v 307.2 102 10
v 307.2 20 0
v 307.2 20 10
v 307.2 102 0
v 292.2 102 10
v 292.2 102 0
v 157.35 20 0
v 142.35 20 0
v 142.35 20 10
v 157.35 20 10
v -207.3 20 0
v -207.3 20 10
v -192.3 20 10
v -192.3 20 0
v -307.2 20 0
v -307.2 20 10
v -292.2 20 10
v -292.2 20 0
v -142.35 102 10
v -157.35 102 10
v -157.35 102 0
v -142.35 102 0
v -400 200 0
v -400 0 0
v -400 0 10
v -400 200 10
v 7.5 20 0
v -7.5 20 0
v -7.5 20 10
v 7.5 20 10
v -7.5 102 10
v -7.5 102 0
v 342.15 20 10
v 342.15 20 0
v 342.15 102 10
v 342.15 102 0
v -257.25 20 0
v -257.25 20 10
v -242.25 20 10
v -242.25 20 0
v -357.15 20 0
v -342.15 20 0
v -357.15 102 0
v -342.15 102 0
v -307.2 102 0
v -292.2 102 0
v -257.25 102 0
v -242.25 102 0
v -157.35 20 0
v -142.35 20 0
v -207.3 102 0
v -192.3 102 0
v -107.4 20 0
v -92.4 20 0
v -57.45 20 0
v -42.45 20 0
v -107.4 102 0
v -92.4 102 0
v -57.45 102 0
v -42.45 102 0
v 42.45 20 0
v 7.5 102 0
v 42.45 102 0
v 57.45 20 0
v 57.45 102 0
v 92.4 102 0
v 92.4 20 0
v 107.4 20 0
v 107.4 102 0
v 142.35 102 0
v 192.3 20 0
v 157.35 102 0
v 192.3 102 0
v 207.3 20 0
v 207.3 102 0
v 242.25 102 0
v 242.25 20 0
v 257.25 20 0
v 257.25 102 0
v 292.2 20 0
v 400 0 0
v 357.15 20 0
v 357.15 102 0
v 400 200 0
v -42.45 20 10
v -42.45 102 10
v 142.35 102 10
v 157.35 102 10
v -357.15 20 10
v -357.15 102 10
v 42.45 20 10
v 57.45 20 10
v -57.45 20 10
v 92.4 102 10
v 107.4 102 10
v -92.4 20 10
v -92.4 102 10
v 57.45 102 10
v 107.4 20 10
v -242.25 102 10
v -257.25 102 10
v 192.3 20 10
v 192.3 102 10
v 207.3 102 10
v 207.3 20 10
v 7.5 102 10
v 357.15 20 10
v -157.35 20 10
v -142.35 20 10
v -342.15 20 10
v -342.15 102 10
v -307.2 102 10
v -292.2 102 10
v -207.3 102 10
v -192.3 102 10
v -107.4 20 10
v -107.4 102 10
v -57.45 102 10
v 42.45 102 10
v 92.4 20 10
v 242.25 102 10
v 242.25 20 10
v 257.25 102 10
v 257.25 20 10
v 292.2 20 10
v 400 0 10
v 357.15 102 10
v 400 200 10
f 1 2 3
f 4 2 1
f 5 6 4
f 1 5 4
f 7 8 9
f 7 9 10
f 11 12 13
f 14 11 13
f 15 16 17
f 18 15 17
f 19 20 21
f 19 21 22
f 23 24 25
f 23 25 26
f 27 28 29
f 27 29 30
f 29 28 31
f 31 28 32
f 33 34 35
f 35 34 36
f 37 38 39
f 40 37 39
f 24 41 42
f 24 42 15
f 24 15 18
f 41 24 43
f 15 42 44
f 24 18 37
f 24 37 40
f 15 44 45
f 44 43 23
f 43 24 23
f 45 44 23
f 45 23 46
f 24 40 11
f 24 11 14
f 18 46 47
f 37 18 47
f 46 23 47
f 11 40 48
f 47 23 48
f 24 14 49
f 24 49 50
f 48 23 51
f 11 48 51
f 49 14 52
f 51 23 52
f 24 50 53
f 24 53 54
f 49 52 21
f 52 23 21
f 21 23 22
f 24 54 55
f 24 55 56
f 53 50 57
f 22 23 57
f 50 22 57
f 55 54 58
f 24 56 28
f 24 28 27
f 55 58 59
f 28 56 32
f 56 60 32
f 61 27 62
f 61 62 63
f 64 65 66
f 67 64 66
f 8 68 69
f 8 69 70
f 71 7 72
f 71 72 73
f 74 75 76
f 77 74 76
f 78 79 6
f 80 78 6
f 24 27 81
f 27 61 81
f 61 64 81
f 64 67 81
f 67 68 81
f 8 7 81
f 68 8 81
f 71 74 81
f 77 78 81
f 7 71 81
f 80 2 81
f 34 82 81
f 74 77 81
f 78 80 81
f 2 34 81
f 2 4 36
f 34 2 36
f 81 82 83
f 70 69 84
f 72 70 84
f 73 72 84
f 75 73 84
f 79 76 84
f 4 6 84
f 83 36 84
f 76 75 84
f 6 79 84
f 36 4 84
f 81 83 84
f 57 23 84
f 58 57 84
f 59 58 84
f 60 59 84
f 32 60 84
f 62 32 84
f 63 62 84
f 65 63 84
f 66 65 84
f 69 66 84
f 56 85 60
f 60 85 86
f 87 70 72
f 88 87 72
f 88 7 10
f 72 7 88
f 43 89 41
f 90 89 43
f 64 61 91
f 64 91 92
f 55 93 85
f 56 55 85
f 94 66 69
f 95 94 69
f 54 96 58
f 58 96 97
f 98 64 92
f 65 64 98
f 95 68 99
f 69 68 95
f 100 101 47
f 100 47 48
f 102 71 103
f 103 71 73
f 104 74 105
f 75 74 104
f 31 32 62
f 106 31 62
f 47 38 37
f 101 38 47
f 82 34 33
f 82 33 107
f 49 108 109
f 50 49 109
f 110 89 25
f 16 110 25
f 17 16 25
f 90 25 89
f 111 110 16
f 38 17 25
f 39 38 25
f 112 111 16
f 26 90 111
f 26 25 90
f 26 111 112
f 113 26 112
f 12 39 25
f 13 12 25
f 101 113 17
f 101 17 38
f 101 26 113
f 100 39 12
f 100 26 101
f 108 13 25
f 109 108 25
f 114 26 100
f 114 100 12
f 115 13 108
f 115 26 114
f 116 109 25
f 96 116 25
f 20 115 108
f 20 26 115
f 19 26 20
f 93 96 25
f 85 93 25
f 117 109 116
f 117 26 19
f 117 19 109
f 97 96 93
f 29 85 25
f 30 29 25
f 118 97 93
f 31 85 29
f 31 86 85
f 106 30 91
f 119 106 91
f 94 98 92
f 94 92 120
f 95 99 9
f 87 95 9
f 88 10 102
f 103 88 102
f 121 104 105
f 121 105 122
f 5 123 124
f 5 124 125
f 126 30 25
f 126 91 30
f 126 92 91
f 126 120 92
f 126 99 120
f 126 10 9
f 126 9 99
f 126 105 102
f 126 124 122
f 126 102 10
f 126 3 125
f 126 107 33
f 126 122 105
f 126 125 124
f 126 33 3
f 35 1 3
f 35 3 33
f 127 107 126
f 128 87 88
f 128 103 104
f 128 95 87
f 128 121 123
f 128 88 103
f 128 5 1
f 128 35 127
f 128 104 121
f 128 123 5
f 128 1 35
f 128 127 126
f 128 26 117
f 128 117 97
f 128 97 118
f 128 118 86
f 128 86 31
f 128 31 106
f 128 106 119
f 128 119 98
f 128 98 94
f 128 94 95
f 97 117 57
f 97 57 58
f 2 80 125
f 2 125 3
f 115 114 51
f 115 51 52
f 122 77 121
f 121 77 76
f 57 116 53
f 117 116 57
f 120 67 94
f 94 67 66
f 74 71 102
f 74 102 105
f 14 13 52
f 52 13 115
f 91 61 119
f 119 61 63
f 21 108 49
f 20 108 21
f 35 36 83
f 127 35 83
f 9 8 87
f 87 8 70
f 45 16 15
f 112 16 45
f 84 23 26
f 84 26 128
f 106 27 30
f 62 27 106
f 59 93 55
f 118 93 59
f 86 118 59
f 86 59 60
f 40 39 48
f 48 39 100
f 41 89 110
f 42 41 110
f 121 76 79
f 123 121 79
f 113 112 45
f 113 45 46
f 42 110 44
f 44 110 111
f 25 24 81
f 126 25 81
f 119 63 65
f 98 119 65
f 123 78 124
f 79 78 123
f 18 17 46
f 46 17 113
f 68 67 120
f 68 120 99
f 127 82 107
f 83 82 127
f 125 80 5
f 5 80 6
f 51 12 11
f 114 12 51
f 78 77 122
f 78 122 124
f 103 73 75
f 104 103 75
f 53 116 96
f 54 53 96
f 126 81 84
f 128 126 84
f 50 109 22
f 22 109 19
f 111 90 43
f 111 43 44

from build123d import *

# Parameters (mm, degrees)
SKETCH002_W                             = 800
SKETCH002_H                             = 200
PAD001_DEPTH                            = 10
SKETCH003_W                             = 15
SKETCH003_H                             = 82
POCKET001_DEPTH                         = 1649.364514
POCKET001_DEPTH_BACK                    = 1659.364514
SKETCH003_LINEARPATTERN002_2_W          = 15
SKETCH003_LINEARPATTERN002_2_H          = 82
POCKET001_LINEARPATTERN002_2_DEPTH      = 1649.364514
POCKET001_LINEARPATTERN002_2_DEPTH_BACK = 1659.364514
SKETCH003_LINEARPATTERN002_3_W          = 15
SKETCH003_LINEARPATTERN002_3_H          = 82
POCKET001_LINEARPATTERN002_3_DEPTH      = 1649.364514
POCKET001_LINEARPATTERN002_3_DEPTH_BACK = 1659.364514
SKETCH003_LINEARPATTERN002_4_W          = 15
SKETCH003_LINEARPATTERN002_4_H          = 82
POCKET001_LINEARPATTERN002_4_DEPTH      = 1649.364514
POCKET001_LINEARPATTERN002_4_DEPTH_BACK = 1659.364514
SKETCH003_LINEARPATTERN002_5_W          = 15
SKETCH003_LINEARPATTERN002_5_H          = 82
POCKET001_LINEARPATTERN002_5_DEPTH      = 1649.364514
POCKET001_LINEARPATTERN002_5_DEPTH_BACK = 1659.364514
SKETCH003_LINEARPATTERN002_6_W          = 15
SKETCH003_LINEARPATTERN002_6_H          = 82
POCKET001_LINEARPATTERN002_6_DEPTH      = 1649.364514
POCKET001_LINEARPATTERN002_6_DEPTH_BACK = 1659.364514
SKETCH003_LINEARPATTERN002_7_W          = 15
SKETCH003_LINEARPATTERN002_7_H          = 82
POCKET001_LINEARPATTERN002_7_DEPTH      = 1649.364514
POCKET001_LINEARPATTERN002_7_DEPTH_BACK = 1659.364514
SKETCH003_LINEARPATTERN002_8_W          = 15
SKETCH003_LINEARPATTERN002_8_H          = 82
POCKET001_LINEARPATTERN002_8_DEPTH      = 1649.364514
POCKET001_LINEARPATTERN002_8_DEPTH_BACK = 1659.364514
LINEARPATTERN003_COUNT                  = 8
LINEARPATTERN003_PITCH                  = 49.95


with BuildPart() as part:
    # Sketch002 → Pad001 (new body)
    with BuildSketch(Plane.XY):
        with Locations((0, 100)):
            Rectangle(SKETCH002_W, SKETCH002_H)
    extrude(amount=PAD001_DEPTH)

    # Sketch003 → Pocket001 (cut, two sides)
    with BuildSketch(Plane(origin=(0, 20, 0), x_dir=(1, 0, 0), z_dir=(0, 0, 1))) as pocket001_sk:
        with Locations((0, 41)):
            Rectangle(SKETCH003_W, SKETCH003_H)
    pocket001 = extrude(amount=-POCKET001_DEPTH, mode=Mode.SUBTRACT) + extrude(pocket001_sk.sketch, amount=POCKET001_DEPTH_BACK, mode=Mode.SUBTRACT)

    # Sketch003 LinearPattern002 2 → Pocket001 LinearPattern002 2 (cut, two sides)
    with BuildSketch(Plane(origin=(49.95, 20, 0), x_dir=(1, 0, 0), z_dir=(0, 0, 1))) as pocket001_linearpattern002_2_sk:
        with Locations((0, 41)):
            Rectangle(SKETCH003_LINEARPATTERN002_2_W, SKETCH003_LINEARPATTERN002_2_H)
    pocket001_linearpattern002_2 = extrude(amount=-POCKET001_LINEARPATTERN002_2_DEPTH, mode=Mode.SUBTRACT) + extrude(pocket001_linearpattern002_2_sk.sketch, amount=POCKET001_LINEARPATTERN002_2_DEPTH_BACK, mode=Mode.SUBTRACT)

    # Sketch003 LinearPattern002 3 → Pocket001 LinearPattern002 3 (cut, two sides)
    with BuildSketch(Plane(origin=(99.9, 20, 0), x_dir=(1, 0, 0), z_dir=(0, 0, 1))) as pocket001_linearpattern002_3_sk:
        with Locations((0, 41)):
            Rectangle(SKETCH003_LINEARPATTERN002_3_W, SKETCH003_LINEARPATTERN002_3_H)
    pocket001_linearpattern002_3 = extrude(amount=-POCKET001_LINEARPATTERN002_3_DEPTH, mode=Mode.SUBTRACT) + extrude(pocket001_linearpattern002_3_sk.sketch, amount=POCKET001_LINEARPATTERN002_3_DEPTH_BACK, mode=Mode.SUBTRACT)

    # Sketch003 LinearPattern002 4 → Pocket001 LinearPattern002 4 (cut, two sides)
    with BuildSketch(Plane(origin=(149.85, 20, 0), x_dir=(1, 0, 0), z_dir=(0, 0, 1))) as pocket001_linearpattern002_4_sk:
        with Locations((0, 41)):
            Rectangle(SKETCH003_LINEARPATTERN002_4_W, SKETCH003_LINEARPATTERN002_4_H)
    pocket001_linearpattern002_4 = extrude(amount=-POCKET001_LINEARPATTERN002_4_DEPTH, mode=Mode.SUBTRACT) + extrude(pocket001_linearpattern002_4_sk.sketch, amount=POCKET001_LINEARPATTERN002_4_DEPTH_BACK, mode=Mode.SUBTRACT)

    # Sketch003 LinearPattern002 5 → Pocket001 LinearPattern002 5 (cut, two sides)
    with BuildSketch(Plane(origin=(199.8, 20, 0), x_dir=(1, 0, 0), z_dir=(0, 0, 1))) as pocket001_linearpattern002_5_sk:
        with Locations((0, 41)):
            Rectangle(SKETCH003_LINEARPATTERN002_5_W, SKETCH003_LINEARPATTERN002_5_H)
    pocket001_linearpattern002_5 = extrude(amount=-POCKET001_LINEARPATTERN002_5_DEPTH, mode=Mode.SUBTRACT) + extrude(pocket001_linearpattern002_5_sk.sketch, amount=POCKET001_LINEARPATTERN002_5_DEPTH_BACK, mode=Mode.SUBTRACT)

    # Sketch003 LinearPattern002 6 → Pocket001 LinearPattern002 6 (cut, two sides)
    with BuildSketch(Plane(origin=(249.75, 20, 0), x_dir=(1, 0, 0), z_dir=(0, 0, 1))) as pocket001_linearpattern002_6_sk:
        with Locations((0, 41)):
            Rectangle(SKETCH003_LINEARPATTERN002_6_W, SKETCH003_LINEARPATTERN002_6_H)
    pocket001_linearpattern002_6 = extrude(amount=-POCKET001_LINEARPATTERN002_6_DEPTH, mode=Mode.SUBTRACT) + extrude(pocket001_linearpattern002_6_sk.sketch, amount=POCKET001_LINEARPATTERN002_6_DEPTH_BACK, mode=Mode.SUBTRACT)

    # Sketch003 LinearPattern002 7 → Pocket001 LinearPattern002 7 (cut, two sides)
    with BuildSketch(Plane(origin=(299.7, 20, 0), x_dir=(1, 0, 0), z_dir=(0, 0, 1))) as pocket001_linearpattern002_7_sk:
        with Locations((0, 41)):
            Rectangle(SKETCH003_LINEARPATTERN002_7_W, SKETCH003_LINEARPATTERN002_7_H)
    pocket001_linearpattern002_7 = extrude(amount=-POCKET001_LINEARPATTERN002_7_DEPTH, mode=Mode.SUBTRACT) + extrude(pocket001_linearpattern002_7_sk.sketch, amount=POCKET001_LINEARPATTERN002_7_DEPTH_BACK, mode=Mode.SUBTRACT)

    # Sketch003 LinearPattern002 8 → Pocket001 LinearPattern002 8 (cut, two sides)
    with BuildSketch(Plane(origin=(349.65, 20, 0), x_dir=(1, 0, 0), z_dir=(0, 0, 1))) as pocket001_linearpattern002_8_sk:
        with Locations((0, 41)):
            Rectangle(SKETCH003_LINEARPATTERN002_8_W, SKETCH003_LINEARPATTERN002_8_H)
    pocket001_linearpattern002_8 = extrude(amount=-POCKET001_LINEARPATTERN002_8_DEPTH, mode=Mode.SUBTRACT) + extrude(pocket001_linearpattern002_8_sk.sketch, amount=POCKET001_LINEARPATTERN002_8_DEPTH_BACK, mode=Mode.SUBTRACT)

    # LinearPattern003: Pocket001, Pocket001 LinearPattern002 2, Pocket001 LinearPattern002 3, Pocket001 LinearPattern002 4, Pocket001 LinearPattern002 5, Pocket001 LinearPattern002 6, Pocket001 LinearPattern002 7, Pocket001 LinearPattern002 8 ×8
    with Locations(*[(-i * LINEARPATTERN003_PITCH, 0, 0) for i in range(1, LINEARPATTERN003_COUNT)]):
        add(pocket001, mode=Mode.SUBTRACT)
        add(pocket001_linearpattern002_2, mode=Mode.SUBTRACT)
        add(pocket001_linearpattern002_3, mode=Mode.SUBTRACT)
        add(pocket001_linearpattern002_4, mode=Mode.SUBTRACT)
        add(pocket001_linearpattern002_5, mode=Mode.SUBTRACT)
        add(pocket001_linearpattern002_6, mode=Mode.SUBTRACT)
        add(pocket001_linearpattern002_7, mode=Mode.SUBTRACT)
        add(pocket001_linearpattern002_8, mode=Mode.SUBTRACT)


solid = part.part
